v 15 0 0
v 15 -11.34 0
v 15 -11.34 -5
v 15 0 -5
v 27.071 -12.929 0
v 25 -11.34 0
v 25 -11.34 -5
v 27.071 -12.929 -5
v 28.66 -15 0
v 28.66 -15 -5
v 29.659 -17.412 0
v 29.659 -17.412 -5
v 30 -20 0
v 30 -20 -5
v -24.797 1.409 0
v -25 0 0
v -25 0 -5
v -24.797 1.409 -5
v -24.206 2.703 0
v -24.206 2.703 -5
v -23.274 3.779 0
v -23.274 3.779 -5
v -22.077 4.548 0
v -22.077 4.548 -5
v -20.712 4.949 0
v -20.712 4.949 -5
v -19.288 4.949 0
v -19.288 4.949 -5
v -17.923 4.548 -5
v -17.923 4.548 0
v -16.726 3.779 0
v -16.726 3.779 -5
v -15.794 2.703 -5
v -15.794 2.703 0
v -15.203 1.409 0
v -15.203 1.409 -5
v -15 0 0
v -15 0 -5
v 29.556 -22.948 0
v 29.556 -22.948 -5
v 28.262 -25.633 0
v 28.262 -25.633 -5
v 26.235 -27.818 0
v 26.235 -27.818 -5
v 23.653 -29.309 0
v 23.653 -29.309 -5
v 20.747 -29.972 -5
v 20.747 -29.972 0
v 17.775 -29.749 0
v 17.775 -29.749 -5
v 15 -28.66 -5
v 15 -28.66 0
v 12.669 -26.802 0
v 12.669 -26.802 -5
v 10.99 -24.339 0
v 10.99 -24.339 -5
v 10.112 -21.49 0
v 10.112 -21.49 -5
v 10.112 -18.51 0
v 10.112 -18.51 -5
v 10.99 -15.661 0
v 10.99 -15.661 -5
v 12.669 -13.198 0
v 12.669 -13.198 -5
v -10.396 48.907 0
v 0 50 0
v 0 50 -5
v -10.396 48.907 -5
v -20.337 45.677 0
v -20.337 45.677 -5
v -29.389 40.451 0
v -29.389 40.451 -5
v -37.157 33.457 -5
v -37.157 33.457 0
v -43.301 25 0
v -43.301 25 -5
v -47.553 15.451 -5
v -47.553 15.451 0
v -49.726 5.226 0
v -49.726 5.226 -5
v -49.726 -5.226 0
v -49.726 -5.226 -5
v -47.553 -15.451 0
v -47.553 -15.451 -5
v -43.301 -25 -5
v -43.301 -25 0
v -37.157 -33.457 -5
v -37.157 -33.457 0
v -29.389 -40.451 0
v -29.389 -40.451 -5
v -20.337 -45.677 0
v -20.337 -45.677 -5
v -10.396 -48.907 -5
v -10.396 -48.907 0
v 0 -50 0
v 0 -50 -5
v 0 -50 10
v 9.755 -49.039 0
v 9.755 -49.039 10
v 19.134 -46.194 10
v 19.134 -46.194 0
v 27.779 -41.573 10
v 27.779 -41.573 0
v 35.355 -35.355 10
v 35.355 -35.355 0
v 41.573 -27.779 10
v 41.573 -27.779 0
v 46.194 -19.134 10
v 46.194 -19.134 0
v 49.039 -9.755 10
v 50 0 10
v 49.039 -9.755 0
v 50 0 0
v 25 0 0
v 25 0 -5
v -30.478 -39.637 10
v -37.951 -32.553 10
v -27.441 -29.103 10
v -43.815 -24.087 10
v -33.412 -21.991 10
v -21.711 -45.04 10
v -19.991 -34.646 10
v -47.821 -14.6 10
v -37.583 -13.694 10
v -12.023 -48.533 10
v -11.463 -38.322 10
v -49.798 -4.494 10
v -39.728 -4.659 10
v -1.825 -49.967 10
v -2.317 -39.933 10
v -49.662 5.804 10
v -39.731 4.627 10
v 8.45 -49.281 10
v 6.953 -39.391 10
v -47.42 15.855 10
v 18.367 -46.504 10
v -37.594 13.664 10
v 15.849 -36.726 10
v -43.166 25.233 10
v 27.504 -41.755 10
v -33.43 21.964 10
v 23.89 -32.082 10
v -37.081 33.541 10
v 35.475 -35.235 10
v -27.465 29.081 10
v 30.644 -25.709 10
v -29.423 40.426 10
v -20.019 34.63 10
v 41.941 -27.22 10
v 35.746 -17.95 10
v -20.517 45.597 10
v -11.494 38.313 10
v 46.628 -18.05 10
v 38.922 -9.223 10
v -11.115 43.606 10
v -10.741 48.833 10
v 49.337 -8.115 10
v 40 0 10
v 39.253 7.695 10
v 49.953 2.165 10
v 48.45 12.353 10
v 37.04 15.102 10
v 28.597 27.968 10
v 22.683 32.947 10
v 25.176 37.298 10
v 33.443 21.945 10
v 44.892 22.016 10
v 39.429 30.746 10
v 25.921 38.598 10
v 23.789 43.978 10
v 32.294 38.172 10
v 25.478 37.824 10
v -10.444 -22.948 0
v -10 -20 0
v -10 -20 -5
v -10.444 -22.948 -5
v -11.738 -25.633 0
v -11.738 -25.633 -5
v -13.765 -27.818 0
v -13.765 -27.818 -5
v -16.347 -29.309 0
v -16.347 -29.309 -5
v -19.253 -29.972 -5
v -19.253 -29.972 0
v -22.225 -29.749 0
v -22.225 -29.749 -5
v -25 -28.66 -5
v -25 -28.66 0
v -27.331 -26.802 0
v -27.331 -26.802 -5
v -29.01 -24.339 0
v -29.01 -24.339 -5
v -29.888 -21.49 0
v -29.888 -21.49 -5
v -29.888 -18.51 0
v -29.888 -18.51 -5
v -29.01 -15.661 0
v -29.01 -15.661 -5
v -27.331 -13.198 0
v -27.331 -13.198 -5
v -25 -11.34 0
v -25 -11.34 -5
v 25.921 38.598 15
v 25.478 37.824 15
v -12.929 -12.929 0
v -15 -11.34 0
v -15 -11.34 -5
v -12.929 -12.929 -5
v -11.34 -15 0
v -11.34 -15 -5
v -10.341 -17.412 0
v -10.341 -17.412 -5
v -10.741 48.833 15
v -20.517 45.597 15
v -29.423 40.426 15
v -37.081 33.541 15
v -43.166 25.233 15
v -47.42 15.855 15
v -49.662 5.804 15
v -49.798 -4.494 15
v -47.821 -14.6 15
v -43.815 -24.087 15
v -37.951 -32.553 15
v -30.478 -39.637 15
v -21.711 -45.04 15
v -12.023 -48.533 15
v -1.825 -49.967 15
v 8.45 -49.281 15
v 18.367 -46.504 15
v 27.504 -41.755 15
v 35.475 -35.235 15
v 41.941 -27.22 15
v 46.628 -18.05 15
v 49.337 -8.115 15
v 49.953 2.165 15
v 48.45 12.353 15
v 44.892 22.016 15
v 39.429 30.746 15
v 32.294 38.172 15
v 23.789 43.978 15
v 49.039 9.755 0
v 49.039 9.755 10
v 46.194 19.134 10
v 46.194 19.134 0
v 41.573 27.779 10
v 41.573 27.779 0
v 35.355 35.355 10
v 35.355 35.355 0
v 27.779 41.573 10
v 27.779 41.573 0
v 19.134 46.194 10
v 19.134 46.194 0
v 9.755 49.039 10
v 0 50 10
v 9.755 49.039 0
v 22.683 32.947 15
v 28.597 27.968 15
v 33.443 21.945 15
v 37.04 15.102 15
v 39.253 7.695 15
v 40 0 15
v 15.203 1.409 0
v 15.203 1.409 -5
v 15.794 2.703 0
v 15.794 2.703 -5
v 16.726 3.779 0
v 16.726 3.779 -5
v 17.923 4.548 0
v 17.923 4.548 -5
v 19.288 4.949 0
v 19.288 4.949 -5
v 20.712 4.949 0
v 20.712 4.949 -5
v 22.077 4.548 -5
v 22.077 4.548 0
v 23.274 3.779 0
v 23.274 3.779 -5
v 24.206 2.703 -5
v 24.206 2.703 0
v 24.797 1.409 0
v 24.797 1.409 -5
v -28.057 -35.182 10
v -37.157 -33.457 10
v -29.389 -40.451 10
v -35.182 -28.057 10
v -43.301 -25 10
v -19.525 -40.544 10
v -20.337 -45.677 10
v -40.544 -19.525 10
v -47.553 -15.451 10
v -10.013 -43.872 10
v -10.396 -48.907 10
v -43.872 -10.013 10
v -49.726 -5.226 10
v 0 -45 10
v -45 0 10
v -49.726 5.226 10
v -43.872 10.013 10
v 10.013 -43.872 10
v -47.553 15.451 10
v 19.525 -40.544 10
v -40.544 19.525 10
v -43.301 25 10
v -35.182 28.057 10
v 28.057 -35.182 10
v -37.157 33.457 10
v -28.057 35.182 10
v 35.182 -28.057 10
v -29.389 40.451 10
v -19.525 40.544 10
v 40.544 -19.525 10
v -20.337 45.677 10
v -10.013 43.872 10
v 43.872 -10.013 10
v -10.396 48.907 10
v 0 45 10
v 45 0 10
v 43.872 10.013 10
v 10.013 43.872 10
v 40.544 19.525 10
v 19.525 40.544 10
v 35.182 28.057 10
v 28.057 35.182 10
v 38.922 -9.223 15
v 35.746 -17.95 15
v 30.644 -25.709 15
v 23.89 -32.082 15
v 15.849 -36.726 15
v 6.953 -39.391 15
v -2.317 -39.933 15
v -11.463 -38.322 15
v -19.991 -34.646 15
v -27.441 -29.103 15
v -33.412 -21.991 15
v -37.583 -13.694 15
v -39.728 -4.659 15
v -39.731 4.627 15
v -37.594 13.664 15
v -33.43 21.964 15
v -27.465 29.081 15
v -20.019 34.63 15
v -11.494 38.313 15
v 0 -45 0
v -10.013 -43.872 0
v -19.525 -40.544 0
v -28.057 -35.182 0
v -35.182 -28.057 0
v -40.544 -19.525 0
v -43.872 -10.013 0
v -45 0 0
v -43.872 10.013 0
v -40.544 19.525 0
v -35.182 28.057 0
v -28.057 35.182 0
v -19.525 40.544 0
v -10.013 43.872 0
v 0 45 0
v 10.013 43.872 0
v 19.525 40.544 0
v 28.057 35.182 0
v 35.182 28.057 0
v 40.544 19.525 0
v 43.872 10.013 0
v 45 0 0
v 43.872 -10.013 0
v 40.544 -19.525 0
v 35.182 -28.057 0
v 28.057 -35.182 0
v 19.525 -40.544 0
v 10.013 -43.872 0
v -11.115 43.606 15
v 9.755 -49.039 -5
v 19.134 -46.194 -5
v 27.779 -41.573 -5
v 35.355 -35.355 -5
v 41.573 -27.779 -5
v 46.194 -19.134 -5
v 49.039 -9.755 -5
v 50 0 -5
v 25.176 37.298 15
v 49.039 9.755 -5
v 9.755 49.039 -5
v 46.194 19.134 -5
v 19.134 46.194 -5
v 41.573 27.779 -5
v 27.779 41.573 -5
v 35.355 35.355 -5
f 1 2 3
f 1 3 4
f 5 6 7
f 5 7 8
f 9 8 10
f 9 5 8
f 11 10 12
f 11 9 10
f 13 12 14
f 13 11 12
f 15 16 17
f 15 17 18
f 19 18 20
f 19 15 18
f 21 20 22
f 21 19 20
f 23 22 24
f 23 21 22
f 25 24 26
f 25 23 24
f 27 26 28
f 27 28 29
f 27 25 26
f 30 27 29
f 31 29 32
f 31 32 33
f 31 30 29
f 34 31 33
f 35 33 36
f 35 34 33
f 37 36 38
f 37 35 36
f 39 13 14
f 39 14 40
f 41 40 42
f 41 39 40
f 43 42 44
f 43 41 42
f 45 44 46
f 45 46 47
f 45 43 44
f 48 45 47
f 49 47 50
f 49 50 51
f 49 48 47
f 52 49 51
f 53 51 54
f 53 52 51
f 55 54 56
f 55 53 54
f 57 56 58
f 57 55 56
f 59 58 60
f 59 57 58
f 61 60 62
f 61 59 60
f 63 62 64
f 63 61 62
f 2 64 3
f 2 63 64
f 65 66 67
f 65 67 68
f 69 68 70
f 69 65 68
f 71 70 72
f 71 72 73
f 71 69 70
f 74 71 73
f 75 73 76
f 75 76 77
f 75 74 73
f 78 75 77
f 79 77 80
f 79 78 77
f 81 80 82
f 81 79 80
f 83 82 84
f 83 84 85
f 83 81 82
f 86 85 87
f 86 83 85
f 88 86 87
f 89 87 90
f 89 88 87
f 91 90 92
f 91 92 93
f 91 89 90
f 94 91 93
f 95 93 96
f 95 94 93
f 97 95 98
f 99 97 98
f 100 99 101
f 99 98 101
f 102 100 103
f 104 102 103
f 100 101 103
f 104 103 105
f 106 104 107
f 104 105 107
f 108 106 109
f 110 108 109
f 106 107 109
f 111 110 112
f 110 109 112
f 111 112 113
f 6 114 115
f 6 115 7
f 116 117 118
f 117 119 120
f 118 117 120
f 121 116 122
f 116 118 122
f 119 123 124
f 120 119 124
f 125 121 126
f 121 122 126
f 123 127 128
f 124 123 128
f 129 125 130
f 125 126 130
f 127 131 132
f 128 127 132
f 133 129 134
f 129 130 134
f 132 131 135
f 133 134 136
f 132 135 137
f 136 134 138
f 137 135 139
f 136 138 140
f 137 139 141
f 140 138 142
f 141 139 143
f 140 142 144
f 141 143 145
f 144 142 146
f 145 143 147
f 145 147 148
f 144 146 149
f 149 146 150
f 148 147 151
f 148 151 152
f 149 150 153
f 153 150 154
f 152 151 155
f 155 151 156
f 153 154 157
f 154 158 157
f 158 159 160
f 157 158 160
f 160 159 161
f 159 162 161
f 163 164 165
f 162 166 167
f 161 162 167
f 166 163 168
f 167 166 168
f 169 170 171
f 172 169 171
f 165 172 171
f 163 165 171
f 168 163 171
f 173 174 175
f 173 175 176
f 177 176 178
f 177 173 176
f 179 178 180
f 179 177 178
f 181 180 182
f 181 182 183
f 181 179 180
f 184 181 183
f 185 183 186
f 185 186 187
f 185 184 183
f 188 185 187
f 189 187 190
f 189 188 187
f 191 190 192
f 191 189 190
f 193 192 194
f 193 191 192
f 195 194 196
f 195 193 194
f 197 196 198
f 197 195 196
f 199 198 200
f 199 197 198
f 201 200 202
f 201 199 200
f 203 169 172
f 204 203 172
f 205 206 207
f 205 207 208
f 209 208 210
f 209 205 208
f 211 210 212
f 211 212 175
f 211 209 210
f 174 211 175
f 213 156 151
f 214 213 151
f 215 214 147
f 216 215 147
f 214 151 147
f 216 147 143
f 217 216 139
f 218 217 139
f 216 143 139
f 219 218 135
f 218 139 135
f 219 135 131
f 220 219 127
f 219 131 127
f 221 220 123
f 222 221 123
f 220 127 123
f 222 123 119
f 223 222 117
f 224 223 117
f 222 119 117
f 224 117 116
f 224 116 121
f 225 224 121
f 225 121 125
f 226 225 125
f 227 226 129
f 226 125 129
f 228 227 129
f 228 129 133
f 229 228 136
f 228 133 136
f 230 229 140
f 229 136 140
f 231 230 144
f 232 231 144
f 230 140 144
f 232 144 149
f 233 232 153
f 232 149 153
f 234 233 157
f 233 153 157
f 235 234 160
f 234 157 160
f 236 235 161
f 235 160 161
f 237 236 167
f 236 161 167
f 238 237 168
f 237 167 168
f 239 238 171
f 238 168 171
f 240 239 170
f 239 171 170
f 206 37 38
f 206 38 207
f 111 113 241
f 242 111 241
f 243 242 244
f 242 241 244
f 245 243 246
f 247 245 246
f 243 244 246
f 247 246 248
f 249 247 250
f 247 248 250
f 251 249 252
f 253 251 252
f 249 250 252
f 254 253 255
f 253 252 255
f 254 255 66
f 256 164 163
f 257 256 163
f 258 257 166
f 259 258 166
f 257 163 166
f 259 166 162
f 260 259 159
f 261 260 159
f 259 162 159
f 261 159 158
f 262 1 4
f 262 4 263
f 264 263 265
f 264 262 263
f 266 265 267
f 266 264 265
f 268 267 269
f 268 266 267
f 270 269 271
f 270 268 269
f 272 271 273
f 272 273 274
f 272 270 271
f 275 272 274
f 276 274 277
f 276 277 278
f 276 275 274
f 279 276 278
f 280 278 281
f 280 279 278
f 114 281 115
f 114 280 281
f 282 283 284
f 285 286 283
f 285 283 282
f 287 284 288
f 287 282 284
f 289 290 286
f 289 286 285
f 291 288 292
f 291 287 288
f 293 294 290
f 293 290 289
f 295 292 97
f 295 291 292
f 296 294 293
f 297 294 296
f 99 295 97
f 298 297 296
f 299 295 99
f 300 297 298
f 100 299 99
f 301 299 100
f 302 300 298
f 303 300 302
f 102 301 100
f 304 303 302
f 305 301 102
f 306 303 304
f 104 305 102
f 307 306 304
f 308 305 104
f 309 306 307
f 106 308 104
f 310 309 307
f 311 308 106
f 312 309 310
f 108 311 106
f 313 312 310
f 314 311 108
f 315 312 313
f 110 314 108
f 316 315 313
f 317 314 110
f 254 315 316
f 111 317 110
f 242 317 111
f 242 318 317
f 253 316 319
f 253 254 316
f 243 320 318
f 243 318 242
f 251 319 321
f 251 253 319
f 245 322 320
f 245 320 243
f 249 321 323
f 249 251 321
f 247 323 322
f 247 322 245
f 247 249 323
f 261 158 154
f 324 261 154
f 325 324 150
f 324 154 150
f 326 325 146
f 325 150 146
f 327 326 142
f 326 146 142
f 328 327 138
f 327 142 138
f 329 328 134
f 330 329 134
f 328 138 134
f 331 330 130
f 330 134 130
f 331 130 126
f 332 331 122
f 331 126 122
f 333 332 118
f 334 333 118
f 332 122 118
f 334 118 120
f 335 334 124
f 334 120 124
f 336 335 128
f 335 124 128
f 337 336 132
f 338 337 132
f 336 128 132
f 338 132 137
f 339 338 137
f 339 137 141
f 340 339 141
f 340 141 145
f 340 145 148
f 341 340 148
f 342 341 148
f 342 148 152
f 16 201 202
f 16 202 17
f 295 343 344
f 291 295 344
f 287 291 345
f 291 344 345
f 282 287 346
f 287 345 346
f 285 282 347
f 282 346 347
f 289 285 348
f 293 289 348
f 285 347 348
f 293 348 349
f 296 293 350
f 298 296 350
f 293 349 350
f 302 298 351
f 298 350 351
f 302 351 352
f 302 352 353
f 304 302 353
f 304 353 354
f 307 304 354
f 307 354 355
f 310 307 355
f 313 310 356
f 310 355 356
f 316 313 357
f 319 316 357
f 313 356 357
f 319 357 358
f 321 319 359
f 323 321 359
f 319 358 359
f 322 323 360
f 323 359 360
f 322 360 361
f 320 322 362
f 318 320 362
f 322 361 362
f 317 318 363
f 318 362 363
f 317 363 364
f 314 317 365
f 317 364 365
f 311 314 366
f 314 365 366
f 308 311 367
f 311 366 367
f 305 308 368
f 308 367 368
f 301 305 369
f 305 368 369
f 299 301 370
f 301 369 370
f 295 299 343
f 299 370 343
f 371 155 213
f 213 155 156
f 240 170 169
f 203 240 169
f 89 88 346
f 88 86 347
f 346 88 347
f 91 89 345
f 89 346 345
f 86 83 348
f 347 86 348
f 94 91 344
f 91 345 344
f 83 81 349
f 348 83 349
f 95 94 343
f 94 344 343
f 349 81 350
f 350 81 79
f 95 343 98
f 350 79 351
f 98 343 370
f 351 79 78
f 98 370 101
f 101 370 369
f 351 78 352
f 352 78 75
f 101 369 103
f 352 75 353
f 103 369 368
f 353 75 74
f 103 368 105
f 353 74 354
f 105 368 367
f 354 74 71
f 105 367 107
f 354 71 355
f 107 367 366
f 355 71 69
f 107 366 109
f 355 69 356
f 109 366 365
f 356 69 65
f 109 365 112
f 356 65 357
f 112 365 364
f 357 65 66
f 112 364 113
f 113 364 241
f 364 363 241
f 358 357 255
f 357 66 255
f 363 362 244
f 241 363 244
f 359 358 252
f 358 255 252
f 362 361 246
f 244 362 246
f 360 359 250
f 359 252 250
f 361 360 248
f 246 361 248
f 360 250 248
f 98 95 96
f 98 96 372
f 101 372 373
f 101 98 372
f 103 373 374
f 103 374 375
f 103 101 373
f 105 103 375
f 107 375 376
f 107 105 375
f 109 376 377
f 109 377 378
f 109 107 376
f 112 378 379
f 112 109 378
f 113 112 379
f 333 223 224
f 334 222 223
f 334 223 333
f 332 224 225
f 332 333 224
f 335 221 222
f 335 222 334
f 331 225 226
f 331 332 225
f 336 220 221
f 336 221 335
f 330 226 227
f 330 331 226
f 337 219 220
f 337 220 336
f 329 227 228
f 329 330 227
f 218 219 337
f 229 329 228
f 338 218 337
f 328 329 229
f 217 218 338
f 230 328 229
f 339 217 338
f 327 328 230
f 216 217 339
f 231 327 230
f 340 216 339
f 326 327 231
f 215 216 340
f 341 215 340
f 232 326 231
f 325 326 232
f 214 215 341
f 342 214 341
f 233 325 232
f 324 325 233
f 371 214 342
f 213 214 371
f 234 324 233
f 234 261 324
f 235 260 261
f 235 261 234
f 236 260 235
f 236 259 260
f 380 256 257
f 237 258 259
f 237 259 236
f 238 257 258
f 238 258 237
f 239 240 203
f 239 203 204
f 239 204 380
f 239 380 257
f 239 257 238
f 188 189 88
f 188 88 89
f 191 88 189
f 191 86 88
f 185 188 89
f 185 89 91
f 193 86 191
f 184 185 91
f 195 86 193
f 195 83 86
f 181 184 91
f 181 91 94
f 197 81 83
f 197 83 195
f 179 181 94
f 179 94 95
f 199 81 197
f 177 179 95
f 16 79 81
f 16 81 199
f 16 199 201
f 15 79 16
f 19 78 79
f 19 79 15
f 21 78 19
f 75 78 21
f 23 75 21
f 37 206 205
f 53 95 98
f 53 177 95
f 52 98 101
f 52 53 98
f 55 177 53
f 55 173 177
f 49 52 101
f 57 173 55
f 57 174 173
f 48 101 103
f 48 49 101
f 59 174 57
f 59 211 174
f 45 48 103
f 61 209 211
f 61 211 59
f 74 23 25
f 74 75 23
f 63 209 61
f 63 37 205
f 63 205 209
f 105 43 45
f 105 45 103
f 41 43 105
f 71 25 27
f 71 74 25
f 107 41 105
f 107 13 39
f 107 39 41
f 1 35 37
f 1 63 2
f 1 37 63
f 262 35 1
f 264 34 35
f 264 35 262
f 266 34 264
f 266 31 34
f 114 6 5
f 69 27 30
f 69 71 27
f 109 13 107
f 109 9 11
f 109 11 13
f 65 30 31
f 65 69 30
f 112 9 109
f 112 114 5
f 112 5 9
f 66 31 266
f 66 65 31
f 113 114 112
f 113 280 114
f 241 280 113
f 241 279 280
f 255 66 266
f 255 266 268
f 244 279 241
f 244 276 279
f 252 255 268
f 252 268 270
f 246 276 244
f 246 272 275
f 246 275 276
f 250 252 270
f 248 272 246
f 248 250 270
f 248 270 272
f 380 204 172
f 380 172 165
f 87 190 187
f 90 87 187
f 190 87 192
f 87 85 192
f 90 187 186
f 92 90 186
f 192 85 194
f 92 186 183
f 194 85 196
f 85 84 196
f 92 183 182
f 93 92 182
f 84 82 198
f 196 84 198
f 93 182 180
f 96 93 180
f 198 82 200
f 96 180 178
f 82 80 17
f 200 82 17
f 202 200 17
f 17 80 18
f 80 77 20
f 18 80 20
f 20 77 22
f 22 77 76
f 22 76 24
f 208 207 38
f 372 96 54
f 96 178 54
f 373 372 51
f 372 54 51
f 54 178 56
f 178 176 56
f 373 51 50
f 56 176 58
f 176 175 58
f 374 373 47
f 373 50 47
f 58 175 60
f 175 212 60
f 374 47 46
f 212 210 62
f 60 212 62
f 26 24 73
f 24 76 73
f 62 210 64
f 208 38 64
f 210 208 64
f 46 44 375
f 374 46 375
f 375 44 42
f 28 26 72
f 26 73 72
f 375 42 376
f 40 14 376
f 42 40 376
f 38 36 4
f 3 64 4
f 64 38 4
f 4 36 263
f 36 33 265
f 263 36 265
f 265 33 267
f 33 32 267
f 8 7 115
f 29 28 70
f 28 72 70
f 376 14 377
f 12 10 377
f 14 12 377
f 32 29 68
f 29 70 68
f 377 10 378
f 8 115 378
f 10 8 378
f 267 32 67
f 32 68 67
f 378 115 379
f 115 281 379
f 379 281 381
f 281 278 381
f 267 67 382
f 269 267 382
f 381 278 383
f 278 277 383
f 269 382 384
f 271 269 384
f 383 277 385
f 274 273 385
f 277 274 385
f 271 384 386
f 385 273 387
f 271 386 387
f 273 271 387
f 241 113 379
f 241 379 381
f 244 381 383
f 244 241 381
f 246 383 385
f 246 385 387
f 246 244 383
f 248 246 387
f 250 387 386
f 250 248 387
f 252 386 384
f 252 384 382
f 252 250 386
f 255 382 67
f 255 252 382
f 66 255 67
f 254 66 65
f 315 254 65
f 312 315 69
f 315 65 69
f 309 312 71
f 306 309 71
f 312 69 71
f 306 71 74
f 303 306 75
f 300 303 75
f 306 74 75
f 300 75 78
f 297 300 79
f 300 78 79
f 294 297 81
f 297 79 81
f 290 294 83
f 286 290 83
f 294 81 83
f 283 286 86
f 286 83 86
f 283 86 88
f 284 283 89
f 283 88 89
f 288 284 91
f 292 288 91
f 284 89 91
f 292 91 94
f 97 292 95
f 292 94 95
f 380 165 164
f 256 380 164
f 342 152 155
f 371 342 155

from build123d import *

# Parameters (mm, degrees)
F1_DEPTH = 5
F2_DEPTH = 10
F4_DEPTH = 5


with BuildPart() as f1:
    # F0 (on Top) → F1 (new body)
    with BuildSketch(Plane.XY):
        with BuildLine():
            ThreePointArc((0, -45), (31.8198051534, -31.8198051534), (45, 0))
            ThreePointArc((45, 0), (31.8198051534, 31.8198051534), (0, 45))
            Line((0, 45), (0, -45))
        make_face()
        with BuildLine():
            Line((15, -11.3397459622), (15, 0))
            ThreePointArc((15, 0), (20, 5), (25, 0))
            Line((25, 0), (25, -11.3397459622))
            ThreePointArc((25, -11.3397459622), (28.6602540378, -15), (30, -20))
            ThreePointArc((30, -20), (15, -28.6602540378), (15, -11.3397459622))
        make_face(mode=Mode.SUBTRACT)
        with BuildLine():
            ThreePointArc((0, 45), (31.8198051534, 31.8198051534), (45, 0))
            ThreePointArc((45, 0), (31.8198051534, -31.8198051534), (0, -45))
            Line((0, -45), (0, -50))
            ThreePointArc((0, -50), (35.3553390593, -35.3553390593), (50, 0))
            ThreePointArc((50, 0), (35.3553390593, 35.3553390593), (0, 50))
            Line((0, 50), (0, 45))
        make_face()
        with BuildLine():
            ThreePointArc((0, -45), (-45, 0), (0, 45))
            Line((0, 45), (0, 50))
            ThreePointArc((0, 50), (-50, 0), (0, -50))
            Line((0, -50), (0, -45))
        make_face()
        with BuildLine():
            Line((0, -45), (0, 45))
            ThreePointArc((0, 45), (-45, 0), (0, -45))
        make_face()
        with BuildLine():
            ThreePointArc((-25, 0), (-20, 5), (-15, 0))
            Line((-15, 0), (-15, -11.3397459622))
            ThreePointArc((-15, -11.3397459622), (-11.3397459622, -15), (-10, -20))
            ThreePointArc((-10, -20), (-25, -28.6602540378), (-25, -11.3397459622))
            Line((-25, -11.3397459622), (-25, 0))
        make_face(mode=Mode.SUBTRACT)
    extrude(amount=-F1_DEPTH)


with BuildPart() as f2:
    # F0 (on Top) → F2 (new body)
    with BuildSketch(Plane.XY):
        with BuildLine():
            ThreePointArc((0, 45), (31.8198051534, 31.8198051534), (45, 0))
            ThreePointArc((45, 0), (31.8198051534, -31.8198051534), (0, -45))
            Line((0, -45), (0, -50))
            ThreePointArc((0, -50), (35.3553390593, -35.3553390593), (50, 0))
            ThreePointArc((50, 0), (35.3553390593, 35.3553390593), (0, 50))
            Line((0, 50), (0, 45))
        make_face()
        with BuildLine():
            ThreePointArc((0, -45), (-45, 0), (0, 45))
            Line((0, 45), (0, 50))
            ThreePointArc((0, 50), (-50, 0), (0, -50))
            Line((0, -50), (0, -45))
        make_face()
    extrude(amount=F2_DEPTH)


with BuildPart() as f4:
    # F3 (on face) → F4 (new body)
    with BuildSketch(Plane.XY.offset(10)):
        with BuildLine():
            ThreePointArc((-10.7405507664, 48.8327817069), (-31.3286806432, -38.9681122093), (50, 0))
            ThreePointArc((50, 0), (42.9502428012, 25.598371888), (23.7889342673, 43.9782515162))
            Line((23.7889342673, 43.9782515162), (25.9209529209, 38.5979841529))
            Line((25.9209529209, 38.5979841529), (25.4777438216, 37.8244674206))
            Line((25.4777438216, 37.8244674206), (25.1762203925, 37.298229539))
            ThreePointArc((25.1762203925, 37.298229539), (39.7361920525, 21.1195416894), (45, 0))
            ThreePointArc((45, 0), (-27.6118154109, -35.53290939), (-11.115006654, 43.6056948928))
            Line((-11.115006654, 43.6056948928), (-10.7405507664, 48.8327817069))
        make_face()
        with BuildLine():
            Line((-11.4941642101, 38.3129767717), (-11.115006654, 43.6056948928))
            ThreePointArc((-11.115006654, 43.6056948928), (-27.6118154109, -35.53290939), (45, 0))
            ThreePointArc((45, 0), (39.7361920525, 21.1195416894), (25.1762203925, 37.298229539))
            Line((25.1762203925, 37.298229539), (22.6828947397, 32.9467188993))
            ThreePointArc((22.6828947397, 32.9467188993), (35.407031714, 18.6102688107), (40, 0))
            ThreePointArc((40, 0), (-23.8771169909, -32.0917946554), (-11.4941642101, 38.3129767717))
        make_face()
    extrude(amount=F4_DEPTH)


solid = Compound([f1.part, f2.part, f4.part])
